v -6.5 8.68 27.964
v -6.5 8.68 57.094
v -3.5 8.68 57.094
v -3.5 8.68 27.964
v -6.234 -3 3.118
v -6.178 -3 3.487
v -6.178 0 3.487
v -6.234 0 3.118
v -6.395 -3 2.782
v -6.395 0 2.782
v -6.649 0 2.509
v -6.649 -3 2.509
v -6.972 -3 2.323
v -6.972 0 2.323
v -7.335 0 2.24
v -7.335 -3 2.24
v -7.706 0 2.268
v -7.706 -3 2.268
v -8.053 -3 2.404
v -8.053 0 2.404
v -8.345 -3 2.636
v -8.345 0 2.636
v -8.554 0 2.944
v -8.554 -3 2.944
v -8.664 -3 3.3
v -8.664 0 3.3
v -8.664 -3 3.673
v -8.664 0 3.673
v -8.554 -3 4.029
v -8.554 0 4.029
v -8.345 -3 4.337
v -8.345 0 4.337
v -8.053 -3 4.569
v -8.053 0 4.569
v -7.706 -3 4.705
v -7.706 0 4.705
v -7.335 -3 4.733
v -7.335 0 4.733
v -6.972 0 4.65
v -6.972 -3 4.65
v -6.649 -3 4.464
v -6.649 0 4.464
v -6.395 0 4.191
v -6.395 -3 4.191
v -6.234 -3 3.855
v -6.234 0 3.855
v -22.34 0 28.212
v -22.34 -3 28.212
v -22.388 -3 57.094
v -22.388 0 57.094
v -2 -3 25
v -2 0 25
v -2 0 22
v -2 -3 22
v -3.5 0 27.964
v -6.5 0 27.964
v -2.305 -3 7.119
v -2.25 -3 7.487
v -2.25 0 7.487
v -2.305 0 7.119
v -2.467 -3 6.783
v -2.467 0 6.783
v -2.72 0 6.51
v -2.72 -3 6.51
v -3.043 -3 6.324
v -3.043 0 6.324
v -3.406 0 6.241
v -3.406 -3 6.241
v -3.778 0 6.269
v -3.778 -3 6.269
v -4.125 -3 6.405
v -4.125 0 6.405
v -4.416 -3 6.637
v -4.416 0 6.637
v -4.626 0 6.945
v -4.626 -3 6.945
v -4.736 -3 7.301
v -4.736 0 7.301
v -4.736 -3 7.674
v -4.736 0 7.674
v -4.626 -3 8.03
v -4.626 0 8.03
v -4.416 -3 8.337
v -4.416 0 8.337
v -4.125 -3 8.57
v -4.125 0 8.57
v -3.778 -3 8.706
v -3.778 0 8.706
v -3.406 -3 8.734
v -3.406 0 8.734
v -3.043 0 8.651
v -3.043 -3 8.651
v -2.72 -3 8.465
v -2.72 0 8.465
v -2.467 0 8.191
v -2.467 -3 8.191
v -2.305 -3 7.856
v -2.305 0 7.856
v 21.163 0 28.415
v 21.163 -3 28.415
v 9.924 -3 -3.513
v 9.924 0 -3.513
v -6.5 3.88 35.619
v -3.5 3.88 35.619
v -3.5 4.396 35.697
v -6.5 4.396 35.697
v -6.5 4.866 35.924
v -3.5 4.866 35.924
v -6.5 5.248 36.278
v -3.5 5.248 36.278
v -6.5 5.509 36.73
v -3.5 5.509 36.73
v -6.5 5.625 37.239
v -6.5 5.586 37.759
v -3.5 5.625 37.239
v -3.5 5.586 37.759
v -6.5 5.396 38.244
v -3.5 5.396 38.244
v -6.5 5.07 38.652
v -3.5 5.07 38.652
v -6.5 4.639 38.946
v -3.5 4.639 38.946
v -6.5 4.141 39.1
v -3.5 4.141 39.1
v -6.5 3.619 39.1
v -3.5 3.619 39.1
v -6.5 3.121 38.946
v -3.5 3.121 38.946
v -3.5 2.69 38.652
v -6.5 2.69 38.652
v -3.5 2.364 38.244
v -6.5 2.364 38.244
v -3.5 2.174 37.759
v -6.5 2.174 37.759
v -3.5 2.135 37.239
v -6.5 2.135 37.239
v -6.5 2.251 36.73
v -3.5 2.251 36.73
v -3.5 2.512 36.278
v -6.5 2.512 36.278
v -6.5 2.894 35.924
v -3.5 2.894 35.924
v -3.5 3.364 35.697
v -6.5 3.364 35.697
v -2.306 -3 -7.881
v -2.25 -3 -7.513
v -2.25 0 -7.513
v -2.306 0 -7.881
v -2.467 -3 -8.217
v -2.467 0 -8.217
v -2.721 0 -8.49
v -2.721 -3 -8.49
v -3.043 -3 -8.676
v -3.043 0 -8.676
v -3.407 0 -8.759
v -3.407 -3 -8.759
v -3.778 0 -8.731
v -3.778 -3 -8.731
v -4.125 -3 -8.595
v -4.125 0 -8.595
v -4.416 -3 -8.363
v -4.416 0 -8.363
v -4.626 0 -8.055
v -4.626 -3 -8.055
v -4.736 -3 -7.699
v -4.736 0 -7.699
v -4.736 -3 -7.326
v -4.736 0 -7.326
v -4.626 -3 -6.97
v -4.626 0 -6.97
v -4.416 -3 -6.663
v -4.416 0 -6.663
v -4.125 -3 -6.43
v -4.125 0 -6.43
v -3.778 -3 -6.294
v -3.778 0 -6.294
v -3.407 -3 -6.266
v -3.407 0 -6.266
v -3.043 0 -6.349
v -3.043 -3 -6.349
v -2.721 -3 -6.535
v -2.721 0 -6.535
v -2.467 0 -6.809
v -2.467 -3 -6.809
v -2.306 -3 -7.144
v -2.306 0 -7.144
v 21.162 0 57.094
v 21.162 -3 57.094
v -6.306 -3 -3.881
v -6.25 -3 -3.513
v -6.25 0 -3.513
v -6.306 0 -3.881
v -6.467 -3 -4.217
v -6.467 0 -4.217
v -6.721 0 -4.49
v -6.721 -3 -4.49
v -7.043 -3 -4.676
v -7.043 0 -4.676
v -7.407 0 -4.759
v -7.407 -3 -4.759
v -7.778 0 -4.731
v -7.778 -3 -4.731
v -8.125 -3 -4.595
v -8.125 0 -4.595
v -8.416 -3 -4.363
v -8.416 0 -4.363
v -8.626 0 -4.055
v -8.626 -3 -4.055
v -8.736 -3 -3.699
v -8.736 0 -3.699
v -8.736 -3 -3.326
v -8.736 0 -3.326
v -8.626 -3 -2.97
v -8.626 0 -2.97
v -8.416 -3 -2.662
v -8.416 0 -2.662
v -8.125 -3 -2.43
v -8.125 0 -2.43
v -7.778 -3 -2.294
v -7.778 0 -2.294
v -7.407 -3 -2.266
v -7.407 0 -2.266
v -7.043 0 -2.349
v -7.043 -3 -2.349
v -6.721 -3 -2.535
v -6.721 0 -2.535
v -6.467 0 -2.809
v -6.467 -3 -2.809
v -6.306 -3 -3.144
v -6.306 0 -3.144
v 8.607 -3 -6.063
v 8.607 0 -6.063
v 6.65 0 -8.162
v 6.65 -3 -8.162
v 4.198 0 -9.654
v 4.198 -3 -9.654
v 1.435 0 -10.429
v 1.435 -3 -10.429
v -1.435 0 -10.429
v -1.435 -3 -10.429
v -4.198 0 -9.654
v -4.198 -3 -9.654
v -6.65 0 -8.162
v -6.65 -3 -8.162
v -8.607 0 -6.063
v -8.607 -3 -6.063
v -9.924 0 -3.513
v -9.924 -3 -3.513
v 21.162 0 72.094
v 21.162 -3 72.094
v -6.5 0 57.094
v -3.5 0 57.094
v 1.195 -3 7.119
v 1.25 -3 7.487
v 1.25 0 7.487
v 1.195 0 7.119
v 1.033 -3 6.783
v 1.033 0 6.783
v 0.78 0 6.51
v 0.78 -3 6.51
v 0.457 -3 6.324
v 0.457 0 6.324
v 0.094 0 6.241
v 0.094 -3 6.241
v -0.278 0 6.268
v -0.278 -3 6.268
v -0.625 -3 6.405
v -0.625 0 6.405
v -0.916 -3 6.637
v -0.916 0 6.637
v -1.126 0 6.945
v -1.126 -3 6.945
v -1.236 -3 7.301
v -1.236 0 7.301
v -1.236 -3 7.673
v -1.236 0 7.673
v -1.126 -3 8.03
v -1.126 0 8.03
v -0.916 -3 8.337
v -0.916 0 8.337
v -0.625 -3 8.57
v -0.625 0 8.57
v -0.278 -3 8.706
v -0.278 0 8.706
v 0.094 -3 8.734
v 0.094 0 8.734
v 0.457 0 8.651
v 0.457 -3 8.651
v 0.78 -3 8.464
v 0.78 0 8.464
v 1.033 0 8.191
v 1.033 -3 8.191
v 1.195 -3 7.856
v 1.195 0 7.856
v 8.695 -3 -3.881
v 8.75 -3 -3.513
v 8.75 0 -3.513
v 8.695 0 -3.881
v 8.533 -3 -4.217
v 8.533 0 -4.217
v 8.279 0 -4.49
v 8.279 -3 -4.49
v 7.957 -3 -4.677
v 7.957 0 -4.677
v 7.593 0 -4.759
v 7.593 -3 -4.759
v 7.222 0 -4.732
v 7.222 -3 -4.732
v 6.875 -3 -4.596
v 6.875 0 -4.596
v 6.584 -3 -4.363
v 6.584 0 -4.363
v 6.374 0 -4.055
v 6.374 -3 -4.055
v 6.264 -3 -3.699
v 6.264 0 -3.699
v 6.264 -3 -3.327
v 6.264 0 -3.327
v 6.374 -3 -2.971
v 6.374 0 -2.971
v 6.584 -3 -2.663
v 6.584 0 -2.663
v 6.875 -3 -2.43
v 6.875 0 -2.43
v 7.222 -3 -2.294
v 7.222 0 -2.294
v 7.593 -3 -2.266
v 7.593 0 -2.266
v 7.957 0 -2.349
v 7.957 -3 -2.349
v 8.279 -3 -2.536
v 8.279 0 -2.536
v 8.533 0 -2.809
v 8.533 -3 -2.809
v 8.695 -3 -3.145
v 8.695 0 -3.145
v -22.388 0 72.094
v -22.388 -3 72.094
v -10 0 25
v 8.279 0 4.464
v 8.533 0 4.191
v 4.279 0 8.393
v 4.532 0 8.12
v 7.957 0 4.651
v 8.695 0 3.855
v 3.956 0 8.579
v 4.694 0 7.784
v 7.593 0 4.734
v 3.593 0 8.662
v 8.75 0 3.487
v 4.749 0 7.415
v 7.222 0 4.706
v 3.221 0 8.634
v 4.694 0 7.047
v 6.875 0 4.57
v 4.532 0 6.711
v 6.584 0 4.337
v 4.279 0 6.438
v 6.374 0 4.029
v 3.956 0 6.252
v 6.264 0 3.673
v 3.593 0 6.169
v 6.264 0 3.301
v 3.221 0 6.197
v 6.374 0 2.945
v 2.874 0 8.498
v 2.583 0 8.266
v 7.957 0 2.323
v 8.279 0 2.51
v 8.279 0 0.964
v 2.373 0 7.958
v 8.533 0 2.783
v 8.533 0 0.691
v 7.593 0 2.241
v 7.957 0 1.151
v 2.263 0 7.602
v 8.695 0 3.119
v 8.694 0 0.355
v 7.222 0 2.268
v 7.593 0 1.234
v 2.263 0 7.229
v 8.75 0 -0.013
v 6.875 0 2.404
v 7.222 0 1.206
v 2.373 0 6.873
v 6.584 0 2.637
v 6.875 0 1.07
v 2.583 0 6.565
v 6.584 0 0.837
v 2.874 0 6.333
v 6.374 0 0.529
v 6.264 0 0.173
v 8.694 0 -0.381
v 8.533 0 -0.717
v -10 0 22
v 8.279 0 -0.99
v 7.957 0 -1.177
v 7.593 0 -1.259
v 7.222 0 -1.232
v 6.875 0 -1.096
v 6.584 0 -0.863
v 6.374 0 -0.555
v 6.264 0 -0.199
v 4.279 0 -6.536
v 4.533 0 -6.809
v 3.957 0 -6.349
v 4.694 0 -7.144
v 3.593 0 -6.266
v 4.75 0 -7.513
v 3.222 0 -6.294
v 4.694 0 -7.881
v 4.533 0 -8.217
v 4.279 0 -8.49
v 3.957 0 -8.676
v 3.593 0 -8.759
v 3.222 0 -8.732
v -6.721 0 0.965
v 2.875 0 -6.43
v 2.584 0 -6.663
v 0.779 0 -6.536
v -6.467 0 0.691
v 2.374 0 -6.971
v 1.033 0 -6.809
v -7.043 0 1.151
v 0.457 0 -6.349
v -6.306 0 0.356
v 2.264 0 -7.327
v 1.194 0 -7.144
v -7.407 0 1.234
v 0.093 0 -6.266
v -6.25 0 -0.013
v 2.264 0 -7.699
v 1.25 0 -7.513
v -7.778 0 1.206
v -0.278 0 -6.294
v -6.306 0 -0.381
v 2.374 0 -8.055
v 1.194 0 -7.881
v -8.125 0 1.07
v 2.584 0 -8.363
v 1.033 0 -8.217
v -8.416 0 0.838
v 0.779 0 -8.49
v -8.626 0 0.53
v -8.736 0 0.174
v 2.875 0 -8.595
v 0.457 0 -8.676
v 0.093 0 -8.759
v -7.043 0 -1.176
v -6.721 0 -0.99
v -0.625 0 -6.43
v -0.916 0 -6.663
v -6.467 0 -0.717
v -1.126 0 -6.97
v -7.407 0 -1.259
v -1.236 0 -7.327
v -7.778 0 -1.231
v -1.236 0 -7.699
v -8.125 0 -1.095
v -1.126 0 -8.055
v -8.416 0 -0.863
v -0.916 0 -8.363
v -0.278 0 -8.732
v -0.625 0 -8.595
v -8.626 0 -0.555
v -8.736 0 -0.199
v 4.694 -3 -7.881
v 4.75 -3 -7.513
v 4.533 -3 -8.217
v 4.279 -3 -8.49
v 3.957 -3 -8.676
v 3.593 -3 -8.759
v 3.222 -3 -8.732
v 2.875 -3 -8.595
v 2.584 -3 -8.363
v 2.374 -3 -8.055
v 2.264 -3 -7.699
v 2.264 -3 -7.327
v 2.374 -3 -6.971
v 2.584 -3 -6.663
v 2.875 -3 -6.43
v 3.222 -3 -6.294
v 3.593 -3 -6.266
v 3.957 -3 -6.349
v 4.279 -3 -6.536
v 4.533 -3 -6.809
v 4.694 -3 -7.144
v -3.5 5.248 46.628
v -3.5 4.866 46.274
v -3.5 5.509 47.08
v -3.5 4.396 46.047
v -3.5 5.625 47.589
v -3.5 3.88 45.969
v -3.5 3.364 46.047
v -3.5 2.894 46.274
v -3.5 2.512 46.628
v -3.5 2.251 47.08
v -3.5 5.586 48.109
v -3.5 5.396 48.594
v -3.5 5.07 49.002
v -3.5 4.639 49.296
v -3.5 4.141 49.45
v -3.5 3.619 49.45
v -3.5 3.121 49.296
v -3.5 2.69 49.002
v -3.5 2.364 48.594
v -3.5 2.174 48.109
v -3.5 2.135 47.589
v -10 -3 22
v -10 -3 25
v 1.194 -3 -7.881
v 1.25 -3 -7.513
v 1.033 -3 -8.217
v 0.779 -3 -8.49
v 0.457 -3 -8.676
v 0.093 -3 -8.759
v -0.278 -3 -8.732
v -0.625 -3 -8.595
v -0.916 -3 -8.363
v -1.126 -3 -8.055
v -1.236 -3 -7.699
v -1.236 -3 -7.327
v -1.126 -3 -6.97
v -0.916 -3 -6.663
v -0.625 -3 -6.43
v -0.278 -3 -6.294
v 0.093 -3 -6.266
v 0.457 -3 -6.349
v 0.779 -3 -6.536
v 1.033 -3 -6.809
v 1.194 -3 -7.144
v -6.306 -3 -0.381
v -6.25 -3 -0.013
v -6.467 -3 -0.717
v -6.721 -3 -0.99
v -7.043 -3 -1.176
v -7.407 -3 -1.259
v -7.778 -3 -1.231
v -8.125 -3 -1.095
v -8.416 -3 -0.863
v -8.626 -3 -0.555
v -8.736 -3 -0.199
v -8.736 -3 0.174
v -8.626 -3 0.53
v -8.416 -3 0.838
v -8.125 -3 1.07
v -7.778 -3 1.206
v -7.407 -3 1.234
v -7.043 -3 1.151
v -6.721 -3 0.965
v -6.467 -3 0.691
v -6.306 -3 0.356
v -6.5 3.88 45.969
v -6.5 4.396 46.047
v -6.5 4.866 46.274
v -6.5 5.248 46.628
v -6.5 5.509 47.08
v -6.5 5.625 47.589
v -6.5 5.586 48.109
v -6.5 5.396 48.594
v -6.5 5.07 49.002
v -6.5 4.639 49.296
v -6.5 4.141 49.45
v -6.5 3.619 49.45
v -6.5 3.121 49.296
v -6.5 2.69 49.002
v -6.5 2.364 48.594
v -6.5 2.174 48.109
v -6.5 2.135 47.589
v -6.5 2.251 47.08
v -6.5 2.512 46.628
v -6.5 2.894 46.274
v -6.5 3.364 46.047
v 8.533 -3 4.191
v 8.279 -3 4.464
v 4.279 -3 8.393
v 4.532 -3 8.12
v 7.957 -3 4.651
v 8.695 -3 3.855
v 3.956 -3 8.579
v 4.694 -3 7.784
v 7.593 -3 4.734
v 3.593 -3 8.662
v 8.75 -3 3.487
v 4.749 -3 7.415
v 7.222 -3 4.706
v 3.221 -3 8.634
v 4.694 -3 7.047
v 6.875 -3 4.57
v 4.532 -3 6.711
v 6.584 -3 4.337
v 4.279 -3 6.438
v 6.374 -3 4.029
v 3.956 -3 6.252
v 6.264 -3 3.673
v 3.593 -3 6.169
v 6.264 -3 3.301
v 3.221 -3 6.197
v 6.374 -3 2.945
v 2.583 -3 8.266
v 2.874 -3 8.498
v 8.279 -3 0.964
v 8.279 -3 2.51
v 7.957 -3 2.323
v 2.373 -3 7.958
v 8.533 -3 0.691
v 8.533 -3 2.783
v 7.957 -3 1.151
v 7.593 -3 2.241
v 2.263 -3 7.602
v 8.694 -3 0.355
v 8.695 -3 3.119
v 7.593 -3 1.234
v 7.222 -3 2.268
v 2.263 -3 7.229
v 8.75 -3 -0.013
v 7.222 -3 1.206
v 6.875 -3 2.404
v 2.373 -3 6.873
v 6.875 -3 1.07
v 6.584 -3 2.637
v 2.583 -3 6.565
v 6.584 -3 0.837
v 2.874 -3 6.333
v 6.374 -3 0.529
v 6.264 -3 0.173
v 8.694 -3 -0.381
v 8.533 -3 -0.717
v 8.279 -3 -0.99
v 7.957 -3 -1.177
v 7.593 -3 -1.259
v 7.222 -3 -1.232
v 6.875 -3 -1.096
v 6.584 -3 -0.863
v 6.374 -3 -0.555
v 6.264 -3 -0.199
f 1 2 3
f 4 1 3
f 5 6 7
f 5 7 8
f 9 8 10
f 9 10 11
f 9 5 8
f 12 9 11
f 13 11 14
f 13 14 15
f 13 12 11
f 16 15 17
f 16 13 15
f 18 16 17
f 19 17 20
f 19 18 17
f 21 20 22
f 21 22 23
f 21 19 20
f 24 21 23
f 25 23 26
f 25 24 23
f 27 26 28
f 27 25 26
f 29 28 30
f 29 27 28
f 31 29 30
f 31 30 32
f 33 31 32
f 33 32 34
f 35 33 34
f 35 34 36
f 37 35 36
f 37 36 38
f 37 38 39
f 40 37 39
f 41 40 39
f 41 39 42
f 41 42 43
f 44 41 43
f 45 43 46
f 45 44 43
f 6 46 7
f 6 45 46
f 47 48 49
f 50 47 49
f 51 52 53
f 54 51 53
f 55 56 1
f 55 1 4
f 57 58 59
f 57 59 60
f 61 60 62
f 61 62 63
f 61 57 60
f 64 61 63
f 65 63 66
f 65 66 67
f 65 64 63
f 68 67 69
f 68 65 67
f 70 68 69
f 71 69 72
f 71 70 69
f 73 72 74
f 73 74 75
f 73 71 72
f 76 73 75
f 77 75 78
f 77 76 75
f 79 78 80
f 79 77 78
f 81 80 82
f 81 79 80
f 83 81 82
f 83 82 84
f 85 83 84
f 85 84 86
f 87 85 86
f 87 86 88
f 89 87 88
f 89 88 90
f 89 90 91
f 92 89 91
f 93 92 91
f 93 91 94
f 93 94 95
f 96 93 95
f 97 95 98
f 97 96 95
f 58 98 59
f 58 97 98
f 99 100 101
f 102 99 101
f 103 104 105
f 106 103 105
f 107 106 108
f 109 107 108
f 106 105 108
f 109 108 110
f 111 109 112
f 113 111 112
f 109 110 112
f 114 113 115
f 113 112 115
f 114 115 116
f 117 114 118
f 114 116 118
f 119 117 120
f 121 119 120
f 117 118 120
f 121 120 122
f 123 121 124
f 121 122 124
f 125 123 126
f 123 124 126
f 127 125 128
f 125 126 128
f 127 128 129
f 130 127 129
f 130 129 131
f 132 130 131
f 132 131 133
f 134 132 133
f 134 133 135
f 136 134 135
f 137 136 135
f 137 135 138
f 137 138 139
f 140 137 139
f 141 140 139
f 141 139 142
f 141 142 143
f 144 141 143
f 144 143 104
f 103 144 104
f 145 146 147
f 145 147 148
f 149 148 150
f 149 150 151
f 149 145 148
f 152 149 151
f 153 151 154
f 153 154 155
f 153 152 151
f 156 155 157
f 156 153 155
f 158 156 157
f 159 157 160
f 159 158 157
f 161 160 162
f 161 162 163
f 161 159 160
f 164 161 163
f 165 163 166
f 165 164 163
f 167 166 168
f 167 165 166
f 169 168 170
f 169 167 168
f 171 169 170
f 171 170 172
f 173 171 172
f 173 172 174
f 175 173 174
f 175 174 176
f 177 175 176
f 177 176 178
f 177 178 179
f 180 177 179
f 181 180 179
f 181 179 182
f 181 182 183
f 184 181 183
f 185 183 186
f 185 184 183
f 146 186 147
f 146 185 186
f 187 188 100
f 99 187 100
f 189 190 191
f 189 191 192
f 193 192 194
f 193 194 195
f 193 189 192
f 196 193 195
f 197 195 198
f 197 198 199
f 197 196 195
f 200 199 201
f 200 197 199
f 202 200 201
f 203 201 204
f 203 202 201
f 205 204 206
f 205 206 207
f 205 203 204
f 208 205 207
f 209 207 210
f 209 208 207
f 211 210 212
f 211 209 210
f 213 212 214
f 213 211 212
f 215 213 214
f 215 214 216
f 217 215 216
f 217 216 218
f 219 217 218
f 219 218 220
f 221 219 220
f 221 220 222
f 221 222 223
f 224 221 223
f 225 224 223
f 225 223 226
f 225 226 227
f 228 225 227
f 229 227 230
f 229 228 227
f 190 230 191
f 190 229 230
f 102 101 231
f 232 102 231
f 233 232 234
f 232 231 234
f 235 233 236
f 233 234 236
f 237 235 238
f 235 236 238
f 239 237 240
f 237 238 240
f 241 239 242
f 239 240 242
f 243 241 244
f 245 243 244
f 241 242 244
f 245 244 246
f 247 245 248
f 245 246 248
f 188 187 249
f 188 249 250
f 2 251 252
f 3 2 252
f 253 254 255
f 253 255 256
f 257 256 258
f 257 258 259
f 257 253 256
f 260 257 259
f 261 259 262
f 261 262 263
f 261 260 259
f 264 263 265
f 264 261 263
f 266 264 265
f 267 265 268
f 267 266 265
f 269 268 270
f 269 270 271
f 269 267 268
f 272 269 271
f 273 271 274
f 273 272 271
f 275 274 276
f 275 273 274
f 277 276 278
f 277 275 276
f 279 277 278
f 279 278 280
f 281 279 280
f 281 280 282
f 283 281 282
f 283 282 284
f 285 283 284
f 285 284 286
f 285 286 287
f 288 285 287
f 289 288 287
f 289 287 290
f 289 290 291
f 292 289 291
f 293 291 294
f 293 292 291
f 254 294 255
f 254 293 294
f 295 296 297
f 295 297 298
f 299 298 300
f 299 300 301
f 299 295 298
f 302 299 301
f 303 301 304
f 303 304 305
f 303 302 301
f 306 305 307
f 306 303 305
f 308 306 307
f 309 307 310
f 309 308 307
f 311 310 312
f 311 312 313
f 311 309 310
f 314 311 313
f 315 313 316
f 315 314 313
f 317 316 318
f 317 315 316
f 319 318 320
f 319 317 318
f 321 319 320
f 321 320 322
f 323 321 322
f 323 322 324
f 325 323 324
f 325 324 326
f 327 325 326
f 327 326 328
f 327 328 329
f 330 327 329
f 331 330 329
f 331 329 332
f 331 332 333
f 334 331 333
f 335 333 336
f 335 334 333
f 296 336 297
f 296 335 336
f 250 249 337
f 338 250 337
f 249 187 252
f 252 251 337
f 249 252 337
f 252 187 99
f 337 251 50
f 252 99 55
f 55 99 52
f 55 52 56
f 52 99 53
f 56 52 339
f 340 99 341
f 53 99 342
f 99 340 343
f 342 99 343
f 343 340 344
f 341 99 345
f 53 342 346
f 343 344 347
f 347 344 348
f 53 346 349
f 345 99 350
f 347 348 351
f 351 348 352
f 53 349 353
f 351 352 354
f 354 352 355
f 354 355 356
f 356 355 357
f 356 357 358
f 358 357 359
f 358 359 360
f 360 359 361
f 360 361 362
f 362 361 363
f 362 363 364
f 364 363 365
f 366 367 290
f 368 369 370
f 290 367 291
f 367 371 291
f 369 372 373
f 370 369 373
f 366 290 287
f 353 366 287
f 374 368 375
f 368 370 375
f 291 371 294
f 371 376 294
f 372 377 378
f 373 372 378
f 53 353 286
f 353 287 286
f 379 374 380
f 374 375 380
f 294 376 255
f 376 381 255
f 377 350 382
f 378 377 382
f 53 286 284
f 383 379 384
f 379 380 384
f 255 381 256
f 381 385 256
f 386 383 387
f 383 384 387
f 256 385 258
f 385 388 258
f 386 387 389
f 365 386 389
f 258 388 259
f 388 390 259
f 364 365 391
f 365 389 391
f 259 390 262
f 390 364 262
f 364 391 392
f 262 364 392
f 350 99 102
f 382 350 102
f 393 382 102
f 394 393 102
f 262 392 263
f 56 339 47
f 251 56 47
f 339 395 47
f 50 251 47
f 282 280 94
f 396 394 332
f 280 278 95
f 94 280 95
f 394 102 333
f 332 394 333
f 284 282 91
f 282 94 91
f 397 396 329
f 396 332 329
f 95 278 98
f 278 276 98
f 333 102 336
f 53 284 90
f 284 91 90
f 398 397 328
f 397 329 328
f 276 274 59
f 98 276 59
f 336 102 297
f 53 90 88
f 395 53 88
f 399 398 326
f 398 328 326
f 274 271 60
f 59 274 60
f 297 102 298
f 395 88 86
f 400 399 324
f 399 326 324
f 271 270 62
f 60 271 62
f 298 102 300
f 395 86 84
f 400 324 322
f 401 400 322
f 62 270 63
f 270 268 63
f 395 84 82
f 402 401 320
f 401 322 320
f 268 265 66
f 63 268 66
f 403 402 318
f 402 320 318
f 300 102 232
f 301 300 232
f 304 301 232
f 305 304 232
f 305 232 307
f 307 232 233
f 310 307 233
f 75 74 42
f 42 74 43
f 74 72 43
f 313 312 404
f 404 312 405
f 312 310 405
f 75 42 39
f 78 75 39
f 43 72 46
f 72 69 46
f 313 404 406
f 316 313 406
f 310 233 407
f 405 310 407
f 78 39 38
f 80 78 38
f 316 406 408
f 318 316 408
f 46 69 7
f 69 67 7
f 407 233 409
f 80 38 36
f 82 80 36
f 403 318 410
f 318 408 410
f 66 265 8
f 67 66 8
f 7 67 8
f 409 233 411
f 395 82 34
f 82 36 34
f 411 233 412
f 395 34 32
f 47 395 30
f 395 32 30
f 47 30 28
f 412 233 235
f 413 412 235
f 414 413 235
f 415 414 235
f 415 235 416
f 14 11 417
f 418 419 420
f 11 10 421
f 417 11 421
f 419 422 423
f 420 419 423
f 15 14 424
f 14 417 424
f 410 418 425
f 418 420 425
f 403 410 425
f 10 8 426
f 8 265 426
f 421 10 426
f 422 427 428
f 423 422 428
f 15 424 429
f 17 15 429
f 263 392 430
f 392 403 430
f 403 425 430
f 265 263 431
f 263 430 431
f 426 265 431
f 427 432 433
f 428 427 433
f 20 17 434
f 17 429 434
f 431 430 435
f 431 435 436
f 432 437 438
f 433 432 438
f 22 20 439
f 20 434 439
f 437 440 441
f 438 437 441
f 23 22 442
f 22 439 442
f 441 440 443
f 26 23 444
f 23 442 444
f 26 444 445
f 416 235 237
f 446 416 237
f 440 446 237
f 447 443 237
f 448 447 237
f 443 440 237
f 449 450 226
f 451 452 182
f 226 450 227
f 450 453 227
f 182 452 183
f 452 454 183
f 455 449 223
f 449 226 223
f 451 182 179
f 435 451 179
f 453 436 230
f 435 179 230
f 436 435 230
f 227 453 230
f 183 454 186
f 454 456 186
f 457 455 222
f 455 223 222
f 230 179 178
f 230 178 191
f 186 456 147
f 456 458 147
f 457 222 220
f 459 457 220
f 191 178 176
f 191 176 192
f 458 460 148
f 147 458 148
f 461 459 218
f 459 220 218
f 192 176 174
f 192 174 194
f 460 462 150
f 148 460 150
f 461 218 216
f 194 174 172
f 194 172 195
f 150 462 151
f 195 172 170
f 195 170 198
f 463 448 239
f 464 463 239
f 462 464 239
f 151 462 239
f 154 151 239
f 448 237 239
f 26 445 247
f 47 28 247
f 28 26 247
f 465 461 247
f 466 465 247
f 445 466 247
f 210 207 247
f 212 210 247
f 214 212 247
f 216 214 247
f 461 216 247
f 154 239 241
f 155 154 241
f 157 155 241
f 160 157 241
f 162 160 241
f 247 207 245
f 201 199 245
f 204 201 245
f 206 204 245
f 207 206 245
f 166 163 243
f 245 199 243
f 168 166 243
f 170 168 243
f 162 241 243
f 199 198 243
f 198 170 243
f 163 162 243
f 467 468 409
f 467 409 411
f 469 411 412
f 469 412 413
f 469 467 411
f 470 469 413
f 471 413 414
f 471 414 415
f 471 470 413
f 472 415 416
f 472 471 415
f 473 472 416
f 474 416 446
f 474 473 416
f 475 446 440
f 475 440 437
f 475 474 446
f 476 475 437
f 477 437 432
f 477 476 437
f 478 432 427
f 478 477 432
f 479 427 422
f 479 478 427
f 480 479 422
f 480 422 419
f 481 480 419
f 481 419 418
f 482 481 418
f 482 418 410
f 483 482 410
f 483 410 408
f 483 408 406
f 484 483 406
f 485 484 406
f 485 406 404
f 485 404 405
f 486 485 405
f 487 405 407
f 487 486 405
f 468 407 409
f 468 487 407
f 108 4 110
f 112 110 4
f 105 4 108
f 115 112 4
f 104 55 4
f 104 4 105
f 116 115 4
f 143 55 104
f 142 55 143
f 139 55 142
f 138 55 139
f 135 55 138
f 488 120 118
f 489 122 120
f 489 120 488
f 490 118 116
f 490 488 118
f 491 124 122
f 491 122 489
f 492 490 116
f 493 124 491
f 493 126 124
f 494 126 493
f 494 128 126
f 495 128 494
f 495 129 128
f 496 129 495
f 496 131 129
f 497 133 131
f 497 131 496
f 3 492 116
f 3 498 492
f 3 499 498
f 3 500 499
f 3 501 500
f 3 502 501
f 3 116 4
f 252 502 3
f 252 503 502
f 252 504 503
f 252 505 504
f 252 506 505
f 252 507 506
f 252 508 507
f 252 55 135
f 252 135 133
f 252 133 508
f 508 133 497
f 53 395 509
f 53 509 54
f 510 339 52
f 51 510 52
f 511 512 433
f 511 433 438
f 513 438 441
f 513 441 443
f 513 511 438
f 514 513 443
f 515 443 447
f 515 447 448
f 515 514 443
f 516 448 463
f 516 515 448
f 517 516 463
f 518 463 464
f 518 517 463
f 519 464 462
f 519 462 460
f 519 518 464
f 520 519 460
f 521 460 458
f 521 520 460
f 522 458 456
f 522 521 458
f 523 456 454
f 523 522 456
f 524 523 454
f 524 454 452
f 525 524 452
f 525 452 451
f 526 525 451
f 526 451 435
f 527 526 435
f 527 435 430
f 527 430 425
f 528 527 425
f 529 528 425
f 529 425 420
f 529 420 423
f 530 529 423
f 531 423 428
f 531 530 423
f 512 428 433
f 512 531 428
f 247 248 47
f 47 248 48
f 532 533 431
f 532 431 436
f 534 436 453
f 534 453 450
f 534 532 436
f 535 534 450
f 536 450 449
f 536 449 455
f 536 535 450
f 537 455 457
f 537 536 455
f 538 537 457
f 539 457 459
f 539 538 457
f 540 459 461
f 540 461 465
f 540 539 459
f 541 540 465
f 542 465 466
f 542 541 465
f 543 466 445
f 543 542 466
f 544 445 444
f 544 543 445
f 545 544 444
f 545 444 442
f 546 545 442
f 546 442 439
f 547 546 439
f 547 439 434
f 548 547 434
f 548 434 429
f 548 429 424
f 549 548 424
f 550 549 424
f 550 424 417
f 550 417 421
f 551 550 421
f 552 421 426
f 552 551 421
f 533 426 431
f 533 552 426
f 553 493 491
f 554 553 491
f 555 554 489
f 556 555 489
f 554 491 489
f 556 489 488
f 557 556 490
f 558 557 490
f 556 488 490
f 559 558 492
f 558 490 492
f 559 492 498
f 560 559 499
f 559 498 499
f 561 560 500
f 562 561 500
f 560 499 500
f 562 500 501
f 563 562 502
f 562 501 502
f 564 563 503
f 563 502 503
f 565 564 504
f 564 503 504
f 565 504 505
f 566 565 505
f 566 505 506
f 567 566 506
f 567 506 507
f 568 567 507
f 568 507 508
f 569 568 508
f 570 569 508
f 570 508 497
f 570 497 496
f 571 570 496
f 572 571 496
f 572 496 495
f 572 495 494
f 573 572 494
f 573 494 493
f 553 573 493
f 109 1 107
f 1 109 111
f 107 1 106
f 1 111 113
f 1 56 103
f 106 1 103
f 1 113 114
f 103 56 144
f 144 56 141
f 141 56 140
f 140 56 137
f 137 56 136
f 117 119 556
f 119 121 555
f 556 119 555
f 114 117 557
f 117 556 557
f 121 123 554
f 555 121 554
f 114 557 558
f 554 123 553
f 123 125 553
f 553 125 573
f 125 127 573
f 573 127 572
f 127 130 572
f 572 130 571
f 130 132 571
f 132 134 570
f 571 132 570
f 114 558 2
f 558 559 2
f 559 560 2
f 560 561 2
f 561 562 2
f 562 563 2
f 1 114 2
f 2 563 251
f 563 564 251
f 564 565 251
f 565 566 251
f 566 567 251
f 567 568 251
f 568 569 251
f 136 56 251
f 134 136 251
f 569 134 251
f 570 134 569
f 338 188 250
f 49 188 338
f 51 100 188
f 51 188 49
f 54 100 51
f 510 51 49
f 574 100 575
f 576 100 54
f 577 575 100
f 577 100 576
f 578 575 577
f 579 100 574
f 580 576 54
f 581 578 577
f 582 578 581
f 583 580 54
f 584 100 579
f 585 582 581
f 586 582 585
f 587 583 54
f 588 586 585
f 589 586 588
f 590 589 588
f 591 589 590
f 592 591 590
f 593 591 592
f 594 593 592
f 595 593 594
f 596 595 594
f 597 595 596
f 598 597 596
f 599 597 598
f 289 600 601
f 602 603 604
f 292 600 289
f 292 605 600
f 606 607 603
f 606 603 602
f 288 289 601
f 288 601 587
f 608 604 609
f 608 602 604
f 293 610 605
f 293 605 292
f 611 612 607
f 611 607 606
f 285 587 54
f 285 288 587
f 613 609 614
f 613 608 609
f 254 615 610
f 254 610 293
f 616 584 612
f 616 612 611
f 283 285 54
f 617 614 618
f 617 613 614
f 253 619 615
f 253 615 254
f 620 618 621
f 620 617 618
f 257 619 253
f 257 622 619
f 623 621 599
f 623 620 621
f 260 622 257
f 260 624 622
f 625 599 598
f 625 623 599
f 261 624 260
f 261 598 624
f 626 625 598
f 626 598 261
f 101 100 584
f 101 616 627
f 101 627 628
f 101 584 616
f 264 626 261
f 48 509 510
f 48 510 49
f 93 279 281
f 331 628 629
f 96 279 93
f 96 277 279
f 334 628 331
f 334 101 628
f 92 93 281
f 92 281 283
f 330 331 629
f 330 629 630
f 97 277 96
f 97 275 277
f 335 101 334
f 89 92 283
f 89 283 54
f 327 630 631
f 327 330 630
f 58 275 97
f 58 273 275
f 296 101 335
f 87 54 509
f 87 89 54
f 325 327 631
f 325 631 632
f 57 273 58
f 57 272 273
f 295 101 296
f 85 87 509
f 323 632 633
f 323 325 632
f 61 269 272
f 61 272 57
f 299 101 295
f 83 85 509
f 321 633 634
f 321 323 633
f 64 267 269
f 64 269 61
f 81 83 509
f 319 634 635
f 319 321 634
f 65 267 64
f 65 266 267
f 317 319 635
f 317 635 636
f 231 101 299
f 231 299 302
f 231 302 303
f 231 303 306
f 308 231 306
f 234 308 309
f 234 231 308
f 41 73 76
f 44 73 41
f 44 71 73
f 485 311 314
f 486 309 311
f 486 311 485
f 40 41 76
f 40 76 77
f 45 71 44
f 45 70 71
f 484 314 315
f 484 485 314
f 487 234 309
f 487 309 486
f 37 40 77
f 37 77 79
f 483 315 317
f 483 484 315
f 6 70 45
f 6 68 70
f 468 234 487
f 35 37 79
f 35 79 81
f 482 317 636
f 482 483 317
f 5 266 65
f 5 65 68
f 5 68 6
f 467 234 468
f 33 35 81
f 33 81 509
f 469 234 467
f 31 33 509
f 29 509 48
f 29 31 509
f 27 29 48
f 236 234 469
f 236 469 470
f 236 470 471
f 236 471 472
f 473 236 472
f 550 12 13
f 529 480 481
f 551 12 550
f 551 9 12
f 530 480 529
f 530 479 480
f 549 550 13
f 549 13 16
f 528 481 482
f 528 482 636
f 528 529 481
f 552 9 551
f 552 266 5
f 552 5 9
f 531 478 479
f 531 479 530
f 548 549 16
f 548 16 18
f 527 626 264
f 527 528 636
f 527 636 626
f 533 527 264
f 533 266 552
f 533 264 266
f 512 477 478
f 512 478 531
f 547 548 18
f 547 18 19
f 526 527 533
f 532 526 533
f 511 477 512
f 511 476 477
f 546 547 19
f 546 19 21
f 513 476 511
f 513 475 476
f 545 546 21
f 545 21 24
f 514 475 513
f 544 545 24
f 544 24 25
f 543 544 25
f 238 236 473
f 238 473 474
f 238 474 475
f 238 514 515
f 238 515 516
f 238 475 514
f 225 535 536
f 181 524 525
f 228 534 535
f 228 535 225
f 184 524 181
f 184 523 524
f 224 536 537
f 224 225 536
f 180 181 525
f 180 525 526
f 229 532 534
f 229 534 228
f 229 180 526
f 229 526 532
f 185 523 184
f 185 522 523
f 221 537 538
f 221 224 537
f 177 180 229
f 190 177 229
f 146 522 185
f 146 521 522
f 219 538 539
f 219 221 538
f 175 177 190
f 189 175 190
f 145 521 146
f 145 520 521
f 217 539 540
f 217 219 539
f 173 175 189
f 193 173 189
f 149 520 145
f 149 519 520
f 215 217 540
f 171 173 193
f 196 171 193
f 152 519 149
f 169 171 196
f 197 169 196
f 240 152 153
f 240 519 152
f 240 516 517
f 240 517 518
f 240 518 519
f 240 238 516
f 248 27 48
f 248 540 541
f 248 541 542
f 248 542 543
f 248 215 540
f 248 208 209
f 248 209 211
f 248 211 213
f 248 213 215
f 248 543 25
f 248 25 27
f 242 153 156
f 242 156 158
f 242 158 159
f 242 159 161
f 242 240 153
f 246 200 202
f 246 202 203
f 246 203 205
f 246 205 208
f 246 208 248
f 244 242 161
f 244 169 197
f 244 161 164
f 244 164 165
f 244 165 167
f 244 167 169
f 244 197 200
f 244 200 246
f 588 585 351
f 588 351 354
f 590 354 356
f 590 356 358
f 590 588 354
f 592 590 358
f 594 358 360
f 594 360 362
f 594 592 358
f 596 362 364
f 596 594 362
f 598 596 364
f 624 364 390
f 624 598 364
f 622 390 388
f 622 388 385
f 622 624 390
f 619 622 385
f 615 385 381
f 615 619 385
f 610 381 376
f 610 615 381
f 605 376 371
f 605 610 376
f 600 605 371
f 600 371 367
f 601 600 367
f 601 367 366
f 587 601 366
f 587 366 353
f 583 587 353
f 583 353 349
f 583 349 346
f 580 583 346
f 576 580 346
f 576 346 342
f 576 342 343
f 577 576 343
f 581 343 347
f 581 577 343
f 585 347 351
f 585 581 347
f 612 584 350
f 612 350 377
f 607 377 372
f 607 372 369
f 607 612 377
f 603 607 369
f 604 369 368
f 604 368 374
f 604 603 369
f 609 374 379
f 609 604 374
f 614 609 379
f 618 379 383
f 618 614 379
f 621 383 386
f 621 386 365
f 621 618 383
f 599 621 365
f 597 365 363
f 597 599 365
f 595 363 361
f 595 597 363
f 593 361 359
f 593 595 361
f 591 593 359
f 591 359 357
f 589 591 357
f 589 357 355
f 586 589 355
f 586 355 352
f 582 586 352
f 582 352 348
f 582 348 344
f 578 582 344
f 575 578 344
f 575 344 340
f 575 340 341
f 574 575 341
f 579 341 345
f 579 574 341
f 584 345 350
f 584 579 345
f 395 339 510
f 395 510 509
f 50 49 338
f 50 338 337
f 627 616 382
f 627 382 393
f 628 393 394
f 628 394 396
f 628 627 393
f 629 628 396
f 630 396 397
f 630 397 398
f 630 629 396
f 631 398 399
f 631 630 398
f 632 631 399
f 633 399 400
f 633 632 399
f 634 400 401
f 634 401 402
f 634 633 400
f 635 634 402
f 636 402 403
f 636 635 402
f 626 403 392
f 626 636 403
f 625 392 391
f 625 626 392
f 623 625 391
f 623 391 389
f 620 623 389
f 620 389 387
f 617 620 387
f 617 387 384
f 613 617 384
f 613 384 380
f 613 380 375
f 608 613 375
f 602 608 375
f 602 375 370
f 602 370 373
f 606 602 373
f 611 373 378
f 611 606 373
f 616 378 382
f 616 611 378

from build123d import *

# Parameters (mm, degrees)
SKETCH2_R           = 1.25
BOSS_EXTRUDE1_DEPTH = 3
SKETCH6_W           = 3
SKETCH6_H           = 29.12999922
BOSS_EXTRUDE3_DEPTH = 11.68
SKETCH9_R           = 1.75
CUT_EXTRUDE2_DEPTH  = 5
BOSS_EXTRUDE4_DEPTH = 15
SKETCH11_W          = 8
SKETCH11_H          = 3
CUT_EXTRUDE4_DEPTH  = 10


with BuildPart() as part:
    # Sketch2 → Boss-Extrude1 (new body)
    with BuildSketch(Plane(origin=(0, 0, 0), x_dir=(1, 0, 0), z_dir=(0, 1, 0))):
        with BuildLine():
            ThreePointArc((9.924191255, 3.512841719), (0, 10.527565199), (-9.924191255, 3.512841719))
            Line((-9.924191255, 3.512841719), (-22.339897891, -28.212185032))
            Line((-22.339897891, -28.212185032), (-22.388445596, -57.094438481))
            Line((-22.388445596, -57.094438481), (21.162477615, -57.094438481))
            Line((21.162477615, -57.094438481), (21.162544036, -28.414715022))
            Line((21.162544036, -28.414715022), (9.924191255, 3.512841719))
        make_face()
        with Locations((-3.499861001, -7.487216855)):
            Circle(SKETCH2_R, mode=Mode.SUBTRACT)
        with Locations((-7.42819985, -3.486548919)):
            Circle(SKETCH2_R, mode=Mode.SUBTRACT)
        with Locations((-7.499989222, 0.012714758)):
            Circle(SKETCH2_R, mode=Mode.SUBTRACT)
        with Locations((-7.500049059, 3.512714758)):
            Circle(SKETCH2_R, mode=Mode.SUBTRACT)
        with Locations((-3.500117445, 7.512783142)):
            Circle(SKETCH2_R, mode=Mode.SUBTRACT)
        with Locations((0.000138999, -7.487157018)):
            Circle(SKETCH2_R, mode=Mode.SUBTRACT)
        with Locations((3.499402676, -7.415367646)):
            Circle(SKETCH2_R, mode=Mode.SUBTRACT)
        with Locations((7.500070612, -3.487028797)):
            Circle(SKETCH2_R, mode=Mode.SUBTRACT)
        with Locations((7.500010775, 0.012971203)):
            Circle(SKETCH2_R, mode=Mode.SUBTRACT)
        with Locations((-0.000117446, 7.512842979)):
            Circle(SKETCH2_R, mode=Mode.SUBTRACT)
        with Locations((3.499882554, 7.512902816)):
            Circle(SKETCH2_R, mode=Mode.SUBTRACT)
        with Locations((7.500070612, 3.512971202)):
            Circle(SKETCH2_R, mode=Mode.SUBTRACT)
    extrude(amount=-BOSS_EXTRUDE1_DEPTH)

    # Sketch6 → Boss-Extrude3 (add)
    with BuildSketch(Plane.XZ.offset(3)):
        with Locations((-5, 42.529438871)):
            Rectangle(SKETCH6_W, SKETCH6_H)
    extrude(amount=-BOSS_EXTRUDE3_DEPTH)

    # Sketch9 → Cut-Extrude2 (cut)
    with BuildSketch(Plane(origin=(-3.5, 0, 0), x_dir=(0, 0, -1), z_dir=(1, 0, 0))):
        with Locations((-37.369439261, 3.88)):
            Circle(SKETCH9_R)
        with Locations((-47.719439261, 3.88)):
            Circle(SKETCH9_R)
    extrude(amount=-CUT_EXTRUDE2_DEPTH, mode=Mode.SUBTRACT)

    # Sketch10 → Boss-Extrude4 (add)
    with BuildSketch(Plane.XY.offset(57.094438481)):
        Polygon((-22.388445596, 0), (-6.5, 0), (-3.5, 0), (21.162477615, 0), (21.162477615, -3), (-22.388445596, -3), align=None)
    extrude(amount=BOSS_EXTRUDE4_DEPTH)

    # Sketch11 → Cut-Extrude4 (cut)
    with BuildSketch(Plane(origin=(0, 0, 0), x_dir=(1, 0, 0), z_dir=(0, 1, 0))):
        with Locations((-6, -23.5)):
            Rectangle(SKETCH11_W, SKETCH11_H)
    extrude(amount=-CUT_EXTRUDE4_DEPTH, mode=Mode.SUBTRACT)


solid = part.part
